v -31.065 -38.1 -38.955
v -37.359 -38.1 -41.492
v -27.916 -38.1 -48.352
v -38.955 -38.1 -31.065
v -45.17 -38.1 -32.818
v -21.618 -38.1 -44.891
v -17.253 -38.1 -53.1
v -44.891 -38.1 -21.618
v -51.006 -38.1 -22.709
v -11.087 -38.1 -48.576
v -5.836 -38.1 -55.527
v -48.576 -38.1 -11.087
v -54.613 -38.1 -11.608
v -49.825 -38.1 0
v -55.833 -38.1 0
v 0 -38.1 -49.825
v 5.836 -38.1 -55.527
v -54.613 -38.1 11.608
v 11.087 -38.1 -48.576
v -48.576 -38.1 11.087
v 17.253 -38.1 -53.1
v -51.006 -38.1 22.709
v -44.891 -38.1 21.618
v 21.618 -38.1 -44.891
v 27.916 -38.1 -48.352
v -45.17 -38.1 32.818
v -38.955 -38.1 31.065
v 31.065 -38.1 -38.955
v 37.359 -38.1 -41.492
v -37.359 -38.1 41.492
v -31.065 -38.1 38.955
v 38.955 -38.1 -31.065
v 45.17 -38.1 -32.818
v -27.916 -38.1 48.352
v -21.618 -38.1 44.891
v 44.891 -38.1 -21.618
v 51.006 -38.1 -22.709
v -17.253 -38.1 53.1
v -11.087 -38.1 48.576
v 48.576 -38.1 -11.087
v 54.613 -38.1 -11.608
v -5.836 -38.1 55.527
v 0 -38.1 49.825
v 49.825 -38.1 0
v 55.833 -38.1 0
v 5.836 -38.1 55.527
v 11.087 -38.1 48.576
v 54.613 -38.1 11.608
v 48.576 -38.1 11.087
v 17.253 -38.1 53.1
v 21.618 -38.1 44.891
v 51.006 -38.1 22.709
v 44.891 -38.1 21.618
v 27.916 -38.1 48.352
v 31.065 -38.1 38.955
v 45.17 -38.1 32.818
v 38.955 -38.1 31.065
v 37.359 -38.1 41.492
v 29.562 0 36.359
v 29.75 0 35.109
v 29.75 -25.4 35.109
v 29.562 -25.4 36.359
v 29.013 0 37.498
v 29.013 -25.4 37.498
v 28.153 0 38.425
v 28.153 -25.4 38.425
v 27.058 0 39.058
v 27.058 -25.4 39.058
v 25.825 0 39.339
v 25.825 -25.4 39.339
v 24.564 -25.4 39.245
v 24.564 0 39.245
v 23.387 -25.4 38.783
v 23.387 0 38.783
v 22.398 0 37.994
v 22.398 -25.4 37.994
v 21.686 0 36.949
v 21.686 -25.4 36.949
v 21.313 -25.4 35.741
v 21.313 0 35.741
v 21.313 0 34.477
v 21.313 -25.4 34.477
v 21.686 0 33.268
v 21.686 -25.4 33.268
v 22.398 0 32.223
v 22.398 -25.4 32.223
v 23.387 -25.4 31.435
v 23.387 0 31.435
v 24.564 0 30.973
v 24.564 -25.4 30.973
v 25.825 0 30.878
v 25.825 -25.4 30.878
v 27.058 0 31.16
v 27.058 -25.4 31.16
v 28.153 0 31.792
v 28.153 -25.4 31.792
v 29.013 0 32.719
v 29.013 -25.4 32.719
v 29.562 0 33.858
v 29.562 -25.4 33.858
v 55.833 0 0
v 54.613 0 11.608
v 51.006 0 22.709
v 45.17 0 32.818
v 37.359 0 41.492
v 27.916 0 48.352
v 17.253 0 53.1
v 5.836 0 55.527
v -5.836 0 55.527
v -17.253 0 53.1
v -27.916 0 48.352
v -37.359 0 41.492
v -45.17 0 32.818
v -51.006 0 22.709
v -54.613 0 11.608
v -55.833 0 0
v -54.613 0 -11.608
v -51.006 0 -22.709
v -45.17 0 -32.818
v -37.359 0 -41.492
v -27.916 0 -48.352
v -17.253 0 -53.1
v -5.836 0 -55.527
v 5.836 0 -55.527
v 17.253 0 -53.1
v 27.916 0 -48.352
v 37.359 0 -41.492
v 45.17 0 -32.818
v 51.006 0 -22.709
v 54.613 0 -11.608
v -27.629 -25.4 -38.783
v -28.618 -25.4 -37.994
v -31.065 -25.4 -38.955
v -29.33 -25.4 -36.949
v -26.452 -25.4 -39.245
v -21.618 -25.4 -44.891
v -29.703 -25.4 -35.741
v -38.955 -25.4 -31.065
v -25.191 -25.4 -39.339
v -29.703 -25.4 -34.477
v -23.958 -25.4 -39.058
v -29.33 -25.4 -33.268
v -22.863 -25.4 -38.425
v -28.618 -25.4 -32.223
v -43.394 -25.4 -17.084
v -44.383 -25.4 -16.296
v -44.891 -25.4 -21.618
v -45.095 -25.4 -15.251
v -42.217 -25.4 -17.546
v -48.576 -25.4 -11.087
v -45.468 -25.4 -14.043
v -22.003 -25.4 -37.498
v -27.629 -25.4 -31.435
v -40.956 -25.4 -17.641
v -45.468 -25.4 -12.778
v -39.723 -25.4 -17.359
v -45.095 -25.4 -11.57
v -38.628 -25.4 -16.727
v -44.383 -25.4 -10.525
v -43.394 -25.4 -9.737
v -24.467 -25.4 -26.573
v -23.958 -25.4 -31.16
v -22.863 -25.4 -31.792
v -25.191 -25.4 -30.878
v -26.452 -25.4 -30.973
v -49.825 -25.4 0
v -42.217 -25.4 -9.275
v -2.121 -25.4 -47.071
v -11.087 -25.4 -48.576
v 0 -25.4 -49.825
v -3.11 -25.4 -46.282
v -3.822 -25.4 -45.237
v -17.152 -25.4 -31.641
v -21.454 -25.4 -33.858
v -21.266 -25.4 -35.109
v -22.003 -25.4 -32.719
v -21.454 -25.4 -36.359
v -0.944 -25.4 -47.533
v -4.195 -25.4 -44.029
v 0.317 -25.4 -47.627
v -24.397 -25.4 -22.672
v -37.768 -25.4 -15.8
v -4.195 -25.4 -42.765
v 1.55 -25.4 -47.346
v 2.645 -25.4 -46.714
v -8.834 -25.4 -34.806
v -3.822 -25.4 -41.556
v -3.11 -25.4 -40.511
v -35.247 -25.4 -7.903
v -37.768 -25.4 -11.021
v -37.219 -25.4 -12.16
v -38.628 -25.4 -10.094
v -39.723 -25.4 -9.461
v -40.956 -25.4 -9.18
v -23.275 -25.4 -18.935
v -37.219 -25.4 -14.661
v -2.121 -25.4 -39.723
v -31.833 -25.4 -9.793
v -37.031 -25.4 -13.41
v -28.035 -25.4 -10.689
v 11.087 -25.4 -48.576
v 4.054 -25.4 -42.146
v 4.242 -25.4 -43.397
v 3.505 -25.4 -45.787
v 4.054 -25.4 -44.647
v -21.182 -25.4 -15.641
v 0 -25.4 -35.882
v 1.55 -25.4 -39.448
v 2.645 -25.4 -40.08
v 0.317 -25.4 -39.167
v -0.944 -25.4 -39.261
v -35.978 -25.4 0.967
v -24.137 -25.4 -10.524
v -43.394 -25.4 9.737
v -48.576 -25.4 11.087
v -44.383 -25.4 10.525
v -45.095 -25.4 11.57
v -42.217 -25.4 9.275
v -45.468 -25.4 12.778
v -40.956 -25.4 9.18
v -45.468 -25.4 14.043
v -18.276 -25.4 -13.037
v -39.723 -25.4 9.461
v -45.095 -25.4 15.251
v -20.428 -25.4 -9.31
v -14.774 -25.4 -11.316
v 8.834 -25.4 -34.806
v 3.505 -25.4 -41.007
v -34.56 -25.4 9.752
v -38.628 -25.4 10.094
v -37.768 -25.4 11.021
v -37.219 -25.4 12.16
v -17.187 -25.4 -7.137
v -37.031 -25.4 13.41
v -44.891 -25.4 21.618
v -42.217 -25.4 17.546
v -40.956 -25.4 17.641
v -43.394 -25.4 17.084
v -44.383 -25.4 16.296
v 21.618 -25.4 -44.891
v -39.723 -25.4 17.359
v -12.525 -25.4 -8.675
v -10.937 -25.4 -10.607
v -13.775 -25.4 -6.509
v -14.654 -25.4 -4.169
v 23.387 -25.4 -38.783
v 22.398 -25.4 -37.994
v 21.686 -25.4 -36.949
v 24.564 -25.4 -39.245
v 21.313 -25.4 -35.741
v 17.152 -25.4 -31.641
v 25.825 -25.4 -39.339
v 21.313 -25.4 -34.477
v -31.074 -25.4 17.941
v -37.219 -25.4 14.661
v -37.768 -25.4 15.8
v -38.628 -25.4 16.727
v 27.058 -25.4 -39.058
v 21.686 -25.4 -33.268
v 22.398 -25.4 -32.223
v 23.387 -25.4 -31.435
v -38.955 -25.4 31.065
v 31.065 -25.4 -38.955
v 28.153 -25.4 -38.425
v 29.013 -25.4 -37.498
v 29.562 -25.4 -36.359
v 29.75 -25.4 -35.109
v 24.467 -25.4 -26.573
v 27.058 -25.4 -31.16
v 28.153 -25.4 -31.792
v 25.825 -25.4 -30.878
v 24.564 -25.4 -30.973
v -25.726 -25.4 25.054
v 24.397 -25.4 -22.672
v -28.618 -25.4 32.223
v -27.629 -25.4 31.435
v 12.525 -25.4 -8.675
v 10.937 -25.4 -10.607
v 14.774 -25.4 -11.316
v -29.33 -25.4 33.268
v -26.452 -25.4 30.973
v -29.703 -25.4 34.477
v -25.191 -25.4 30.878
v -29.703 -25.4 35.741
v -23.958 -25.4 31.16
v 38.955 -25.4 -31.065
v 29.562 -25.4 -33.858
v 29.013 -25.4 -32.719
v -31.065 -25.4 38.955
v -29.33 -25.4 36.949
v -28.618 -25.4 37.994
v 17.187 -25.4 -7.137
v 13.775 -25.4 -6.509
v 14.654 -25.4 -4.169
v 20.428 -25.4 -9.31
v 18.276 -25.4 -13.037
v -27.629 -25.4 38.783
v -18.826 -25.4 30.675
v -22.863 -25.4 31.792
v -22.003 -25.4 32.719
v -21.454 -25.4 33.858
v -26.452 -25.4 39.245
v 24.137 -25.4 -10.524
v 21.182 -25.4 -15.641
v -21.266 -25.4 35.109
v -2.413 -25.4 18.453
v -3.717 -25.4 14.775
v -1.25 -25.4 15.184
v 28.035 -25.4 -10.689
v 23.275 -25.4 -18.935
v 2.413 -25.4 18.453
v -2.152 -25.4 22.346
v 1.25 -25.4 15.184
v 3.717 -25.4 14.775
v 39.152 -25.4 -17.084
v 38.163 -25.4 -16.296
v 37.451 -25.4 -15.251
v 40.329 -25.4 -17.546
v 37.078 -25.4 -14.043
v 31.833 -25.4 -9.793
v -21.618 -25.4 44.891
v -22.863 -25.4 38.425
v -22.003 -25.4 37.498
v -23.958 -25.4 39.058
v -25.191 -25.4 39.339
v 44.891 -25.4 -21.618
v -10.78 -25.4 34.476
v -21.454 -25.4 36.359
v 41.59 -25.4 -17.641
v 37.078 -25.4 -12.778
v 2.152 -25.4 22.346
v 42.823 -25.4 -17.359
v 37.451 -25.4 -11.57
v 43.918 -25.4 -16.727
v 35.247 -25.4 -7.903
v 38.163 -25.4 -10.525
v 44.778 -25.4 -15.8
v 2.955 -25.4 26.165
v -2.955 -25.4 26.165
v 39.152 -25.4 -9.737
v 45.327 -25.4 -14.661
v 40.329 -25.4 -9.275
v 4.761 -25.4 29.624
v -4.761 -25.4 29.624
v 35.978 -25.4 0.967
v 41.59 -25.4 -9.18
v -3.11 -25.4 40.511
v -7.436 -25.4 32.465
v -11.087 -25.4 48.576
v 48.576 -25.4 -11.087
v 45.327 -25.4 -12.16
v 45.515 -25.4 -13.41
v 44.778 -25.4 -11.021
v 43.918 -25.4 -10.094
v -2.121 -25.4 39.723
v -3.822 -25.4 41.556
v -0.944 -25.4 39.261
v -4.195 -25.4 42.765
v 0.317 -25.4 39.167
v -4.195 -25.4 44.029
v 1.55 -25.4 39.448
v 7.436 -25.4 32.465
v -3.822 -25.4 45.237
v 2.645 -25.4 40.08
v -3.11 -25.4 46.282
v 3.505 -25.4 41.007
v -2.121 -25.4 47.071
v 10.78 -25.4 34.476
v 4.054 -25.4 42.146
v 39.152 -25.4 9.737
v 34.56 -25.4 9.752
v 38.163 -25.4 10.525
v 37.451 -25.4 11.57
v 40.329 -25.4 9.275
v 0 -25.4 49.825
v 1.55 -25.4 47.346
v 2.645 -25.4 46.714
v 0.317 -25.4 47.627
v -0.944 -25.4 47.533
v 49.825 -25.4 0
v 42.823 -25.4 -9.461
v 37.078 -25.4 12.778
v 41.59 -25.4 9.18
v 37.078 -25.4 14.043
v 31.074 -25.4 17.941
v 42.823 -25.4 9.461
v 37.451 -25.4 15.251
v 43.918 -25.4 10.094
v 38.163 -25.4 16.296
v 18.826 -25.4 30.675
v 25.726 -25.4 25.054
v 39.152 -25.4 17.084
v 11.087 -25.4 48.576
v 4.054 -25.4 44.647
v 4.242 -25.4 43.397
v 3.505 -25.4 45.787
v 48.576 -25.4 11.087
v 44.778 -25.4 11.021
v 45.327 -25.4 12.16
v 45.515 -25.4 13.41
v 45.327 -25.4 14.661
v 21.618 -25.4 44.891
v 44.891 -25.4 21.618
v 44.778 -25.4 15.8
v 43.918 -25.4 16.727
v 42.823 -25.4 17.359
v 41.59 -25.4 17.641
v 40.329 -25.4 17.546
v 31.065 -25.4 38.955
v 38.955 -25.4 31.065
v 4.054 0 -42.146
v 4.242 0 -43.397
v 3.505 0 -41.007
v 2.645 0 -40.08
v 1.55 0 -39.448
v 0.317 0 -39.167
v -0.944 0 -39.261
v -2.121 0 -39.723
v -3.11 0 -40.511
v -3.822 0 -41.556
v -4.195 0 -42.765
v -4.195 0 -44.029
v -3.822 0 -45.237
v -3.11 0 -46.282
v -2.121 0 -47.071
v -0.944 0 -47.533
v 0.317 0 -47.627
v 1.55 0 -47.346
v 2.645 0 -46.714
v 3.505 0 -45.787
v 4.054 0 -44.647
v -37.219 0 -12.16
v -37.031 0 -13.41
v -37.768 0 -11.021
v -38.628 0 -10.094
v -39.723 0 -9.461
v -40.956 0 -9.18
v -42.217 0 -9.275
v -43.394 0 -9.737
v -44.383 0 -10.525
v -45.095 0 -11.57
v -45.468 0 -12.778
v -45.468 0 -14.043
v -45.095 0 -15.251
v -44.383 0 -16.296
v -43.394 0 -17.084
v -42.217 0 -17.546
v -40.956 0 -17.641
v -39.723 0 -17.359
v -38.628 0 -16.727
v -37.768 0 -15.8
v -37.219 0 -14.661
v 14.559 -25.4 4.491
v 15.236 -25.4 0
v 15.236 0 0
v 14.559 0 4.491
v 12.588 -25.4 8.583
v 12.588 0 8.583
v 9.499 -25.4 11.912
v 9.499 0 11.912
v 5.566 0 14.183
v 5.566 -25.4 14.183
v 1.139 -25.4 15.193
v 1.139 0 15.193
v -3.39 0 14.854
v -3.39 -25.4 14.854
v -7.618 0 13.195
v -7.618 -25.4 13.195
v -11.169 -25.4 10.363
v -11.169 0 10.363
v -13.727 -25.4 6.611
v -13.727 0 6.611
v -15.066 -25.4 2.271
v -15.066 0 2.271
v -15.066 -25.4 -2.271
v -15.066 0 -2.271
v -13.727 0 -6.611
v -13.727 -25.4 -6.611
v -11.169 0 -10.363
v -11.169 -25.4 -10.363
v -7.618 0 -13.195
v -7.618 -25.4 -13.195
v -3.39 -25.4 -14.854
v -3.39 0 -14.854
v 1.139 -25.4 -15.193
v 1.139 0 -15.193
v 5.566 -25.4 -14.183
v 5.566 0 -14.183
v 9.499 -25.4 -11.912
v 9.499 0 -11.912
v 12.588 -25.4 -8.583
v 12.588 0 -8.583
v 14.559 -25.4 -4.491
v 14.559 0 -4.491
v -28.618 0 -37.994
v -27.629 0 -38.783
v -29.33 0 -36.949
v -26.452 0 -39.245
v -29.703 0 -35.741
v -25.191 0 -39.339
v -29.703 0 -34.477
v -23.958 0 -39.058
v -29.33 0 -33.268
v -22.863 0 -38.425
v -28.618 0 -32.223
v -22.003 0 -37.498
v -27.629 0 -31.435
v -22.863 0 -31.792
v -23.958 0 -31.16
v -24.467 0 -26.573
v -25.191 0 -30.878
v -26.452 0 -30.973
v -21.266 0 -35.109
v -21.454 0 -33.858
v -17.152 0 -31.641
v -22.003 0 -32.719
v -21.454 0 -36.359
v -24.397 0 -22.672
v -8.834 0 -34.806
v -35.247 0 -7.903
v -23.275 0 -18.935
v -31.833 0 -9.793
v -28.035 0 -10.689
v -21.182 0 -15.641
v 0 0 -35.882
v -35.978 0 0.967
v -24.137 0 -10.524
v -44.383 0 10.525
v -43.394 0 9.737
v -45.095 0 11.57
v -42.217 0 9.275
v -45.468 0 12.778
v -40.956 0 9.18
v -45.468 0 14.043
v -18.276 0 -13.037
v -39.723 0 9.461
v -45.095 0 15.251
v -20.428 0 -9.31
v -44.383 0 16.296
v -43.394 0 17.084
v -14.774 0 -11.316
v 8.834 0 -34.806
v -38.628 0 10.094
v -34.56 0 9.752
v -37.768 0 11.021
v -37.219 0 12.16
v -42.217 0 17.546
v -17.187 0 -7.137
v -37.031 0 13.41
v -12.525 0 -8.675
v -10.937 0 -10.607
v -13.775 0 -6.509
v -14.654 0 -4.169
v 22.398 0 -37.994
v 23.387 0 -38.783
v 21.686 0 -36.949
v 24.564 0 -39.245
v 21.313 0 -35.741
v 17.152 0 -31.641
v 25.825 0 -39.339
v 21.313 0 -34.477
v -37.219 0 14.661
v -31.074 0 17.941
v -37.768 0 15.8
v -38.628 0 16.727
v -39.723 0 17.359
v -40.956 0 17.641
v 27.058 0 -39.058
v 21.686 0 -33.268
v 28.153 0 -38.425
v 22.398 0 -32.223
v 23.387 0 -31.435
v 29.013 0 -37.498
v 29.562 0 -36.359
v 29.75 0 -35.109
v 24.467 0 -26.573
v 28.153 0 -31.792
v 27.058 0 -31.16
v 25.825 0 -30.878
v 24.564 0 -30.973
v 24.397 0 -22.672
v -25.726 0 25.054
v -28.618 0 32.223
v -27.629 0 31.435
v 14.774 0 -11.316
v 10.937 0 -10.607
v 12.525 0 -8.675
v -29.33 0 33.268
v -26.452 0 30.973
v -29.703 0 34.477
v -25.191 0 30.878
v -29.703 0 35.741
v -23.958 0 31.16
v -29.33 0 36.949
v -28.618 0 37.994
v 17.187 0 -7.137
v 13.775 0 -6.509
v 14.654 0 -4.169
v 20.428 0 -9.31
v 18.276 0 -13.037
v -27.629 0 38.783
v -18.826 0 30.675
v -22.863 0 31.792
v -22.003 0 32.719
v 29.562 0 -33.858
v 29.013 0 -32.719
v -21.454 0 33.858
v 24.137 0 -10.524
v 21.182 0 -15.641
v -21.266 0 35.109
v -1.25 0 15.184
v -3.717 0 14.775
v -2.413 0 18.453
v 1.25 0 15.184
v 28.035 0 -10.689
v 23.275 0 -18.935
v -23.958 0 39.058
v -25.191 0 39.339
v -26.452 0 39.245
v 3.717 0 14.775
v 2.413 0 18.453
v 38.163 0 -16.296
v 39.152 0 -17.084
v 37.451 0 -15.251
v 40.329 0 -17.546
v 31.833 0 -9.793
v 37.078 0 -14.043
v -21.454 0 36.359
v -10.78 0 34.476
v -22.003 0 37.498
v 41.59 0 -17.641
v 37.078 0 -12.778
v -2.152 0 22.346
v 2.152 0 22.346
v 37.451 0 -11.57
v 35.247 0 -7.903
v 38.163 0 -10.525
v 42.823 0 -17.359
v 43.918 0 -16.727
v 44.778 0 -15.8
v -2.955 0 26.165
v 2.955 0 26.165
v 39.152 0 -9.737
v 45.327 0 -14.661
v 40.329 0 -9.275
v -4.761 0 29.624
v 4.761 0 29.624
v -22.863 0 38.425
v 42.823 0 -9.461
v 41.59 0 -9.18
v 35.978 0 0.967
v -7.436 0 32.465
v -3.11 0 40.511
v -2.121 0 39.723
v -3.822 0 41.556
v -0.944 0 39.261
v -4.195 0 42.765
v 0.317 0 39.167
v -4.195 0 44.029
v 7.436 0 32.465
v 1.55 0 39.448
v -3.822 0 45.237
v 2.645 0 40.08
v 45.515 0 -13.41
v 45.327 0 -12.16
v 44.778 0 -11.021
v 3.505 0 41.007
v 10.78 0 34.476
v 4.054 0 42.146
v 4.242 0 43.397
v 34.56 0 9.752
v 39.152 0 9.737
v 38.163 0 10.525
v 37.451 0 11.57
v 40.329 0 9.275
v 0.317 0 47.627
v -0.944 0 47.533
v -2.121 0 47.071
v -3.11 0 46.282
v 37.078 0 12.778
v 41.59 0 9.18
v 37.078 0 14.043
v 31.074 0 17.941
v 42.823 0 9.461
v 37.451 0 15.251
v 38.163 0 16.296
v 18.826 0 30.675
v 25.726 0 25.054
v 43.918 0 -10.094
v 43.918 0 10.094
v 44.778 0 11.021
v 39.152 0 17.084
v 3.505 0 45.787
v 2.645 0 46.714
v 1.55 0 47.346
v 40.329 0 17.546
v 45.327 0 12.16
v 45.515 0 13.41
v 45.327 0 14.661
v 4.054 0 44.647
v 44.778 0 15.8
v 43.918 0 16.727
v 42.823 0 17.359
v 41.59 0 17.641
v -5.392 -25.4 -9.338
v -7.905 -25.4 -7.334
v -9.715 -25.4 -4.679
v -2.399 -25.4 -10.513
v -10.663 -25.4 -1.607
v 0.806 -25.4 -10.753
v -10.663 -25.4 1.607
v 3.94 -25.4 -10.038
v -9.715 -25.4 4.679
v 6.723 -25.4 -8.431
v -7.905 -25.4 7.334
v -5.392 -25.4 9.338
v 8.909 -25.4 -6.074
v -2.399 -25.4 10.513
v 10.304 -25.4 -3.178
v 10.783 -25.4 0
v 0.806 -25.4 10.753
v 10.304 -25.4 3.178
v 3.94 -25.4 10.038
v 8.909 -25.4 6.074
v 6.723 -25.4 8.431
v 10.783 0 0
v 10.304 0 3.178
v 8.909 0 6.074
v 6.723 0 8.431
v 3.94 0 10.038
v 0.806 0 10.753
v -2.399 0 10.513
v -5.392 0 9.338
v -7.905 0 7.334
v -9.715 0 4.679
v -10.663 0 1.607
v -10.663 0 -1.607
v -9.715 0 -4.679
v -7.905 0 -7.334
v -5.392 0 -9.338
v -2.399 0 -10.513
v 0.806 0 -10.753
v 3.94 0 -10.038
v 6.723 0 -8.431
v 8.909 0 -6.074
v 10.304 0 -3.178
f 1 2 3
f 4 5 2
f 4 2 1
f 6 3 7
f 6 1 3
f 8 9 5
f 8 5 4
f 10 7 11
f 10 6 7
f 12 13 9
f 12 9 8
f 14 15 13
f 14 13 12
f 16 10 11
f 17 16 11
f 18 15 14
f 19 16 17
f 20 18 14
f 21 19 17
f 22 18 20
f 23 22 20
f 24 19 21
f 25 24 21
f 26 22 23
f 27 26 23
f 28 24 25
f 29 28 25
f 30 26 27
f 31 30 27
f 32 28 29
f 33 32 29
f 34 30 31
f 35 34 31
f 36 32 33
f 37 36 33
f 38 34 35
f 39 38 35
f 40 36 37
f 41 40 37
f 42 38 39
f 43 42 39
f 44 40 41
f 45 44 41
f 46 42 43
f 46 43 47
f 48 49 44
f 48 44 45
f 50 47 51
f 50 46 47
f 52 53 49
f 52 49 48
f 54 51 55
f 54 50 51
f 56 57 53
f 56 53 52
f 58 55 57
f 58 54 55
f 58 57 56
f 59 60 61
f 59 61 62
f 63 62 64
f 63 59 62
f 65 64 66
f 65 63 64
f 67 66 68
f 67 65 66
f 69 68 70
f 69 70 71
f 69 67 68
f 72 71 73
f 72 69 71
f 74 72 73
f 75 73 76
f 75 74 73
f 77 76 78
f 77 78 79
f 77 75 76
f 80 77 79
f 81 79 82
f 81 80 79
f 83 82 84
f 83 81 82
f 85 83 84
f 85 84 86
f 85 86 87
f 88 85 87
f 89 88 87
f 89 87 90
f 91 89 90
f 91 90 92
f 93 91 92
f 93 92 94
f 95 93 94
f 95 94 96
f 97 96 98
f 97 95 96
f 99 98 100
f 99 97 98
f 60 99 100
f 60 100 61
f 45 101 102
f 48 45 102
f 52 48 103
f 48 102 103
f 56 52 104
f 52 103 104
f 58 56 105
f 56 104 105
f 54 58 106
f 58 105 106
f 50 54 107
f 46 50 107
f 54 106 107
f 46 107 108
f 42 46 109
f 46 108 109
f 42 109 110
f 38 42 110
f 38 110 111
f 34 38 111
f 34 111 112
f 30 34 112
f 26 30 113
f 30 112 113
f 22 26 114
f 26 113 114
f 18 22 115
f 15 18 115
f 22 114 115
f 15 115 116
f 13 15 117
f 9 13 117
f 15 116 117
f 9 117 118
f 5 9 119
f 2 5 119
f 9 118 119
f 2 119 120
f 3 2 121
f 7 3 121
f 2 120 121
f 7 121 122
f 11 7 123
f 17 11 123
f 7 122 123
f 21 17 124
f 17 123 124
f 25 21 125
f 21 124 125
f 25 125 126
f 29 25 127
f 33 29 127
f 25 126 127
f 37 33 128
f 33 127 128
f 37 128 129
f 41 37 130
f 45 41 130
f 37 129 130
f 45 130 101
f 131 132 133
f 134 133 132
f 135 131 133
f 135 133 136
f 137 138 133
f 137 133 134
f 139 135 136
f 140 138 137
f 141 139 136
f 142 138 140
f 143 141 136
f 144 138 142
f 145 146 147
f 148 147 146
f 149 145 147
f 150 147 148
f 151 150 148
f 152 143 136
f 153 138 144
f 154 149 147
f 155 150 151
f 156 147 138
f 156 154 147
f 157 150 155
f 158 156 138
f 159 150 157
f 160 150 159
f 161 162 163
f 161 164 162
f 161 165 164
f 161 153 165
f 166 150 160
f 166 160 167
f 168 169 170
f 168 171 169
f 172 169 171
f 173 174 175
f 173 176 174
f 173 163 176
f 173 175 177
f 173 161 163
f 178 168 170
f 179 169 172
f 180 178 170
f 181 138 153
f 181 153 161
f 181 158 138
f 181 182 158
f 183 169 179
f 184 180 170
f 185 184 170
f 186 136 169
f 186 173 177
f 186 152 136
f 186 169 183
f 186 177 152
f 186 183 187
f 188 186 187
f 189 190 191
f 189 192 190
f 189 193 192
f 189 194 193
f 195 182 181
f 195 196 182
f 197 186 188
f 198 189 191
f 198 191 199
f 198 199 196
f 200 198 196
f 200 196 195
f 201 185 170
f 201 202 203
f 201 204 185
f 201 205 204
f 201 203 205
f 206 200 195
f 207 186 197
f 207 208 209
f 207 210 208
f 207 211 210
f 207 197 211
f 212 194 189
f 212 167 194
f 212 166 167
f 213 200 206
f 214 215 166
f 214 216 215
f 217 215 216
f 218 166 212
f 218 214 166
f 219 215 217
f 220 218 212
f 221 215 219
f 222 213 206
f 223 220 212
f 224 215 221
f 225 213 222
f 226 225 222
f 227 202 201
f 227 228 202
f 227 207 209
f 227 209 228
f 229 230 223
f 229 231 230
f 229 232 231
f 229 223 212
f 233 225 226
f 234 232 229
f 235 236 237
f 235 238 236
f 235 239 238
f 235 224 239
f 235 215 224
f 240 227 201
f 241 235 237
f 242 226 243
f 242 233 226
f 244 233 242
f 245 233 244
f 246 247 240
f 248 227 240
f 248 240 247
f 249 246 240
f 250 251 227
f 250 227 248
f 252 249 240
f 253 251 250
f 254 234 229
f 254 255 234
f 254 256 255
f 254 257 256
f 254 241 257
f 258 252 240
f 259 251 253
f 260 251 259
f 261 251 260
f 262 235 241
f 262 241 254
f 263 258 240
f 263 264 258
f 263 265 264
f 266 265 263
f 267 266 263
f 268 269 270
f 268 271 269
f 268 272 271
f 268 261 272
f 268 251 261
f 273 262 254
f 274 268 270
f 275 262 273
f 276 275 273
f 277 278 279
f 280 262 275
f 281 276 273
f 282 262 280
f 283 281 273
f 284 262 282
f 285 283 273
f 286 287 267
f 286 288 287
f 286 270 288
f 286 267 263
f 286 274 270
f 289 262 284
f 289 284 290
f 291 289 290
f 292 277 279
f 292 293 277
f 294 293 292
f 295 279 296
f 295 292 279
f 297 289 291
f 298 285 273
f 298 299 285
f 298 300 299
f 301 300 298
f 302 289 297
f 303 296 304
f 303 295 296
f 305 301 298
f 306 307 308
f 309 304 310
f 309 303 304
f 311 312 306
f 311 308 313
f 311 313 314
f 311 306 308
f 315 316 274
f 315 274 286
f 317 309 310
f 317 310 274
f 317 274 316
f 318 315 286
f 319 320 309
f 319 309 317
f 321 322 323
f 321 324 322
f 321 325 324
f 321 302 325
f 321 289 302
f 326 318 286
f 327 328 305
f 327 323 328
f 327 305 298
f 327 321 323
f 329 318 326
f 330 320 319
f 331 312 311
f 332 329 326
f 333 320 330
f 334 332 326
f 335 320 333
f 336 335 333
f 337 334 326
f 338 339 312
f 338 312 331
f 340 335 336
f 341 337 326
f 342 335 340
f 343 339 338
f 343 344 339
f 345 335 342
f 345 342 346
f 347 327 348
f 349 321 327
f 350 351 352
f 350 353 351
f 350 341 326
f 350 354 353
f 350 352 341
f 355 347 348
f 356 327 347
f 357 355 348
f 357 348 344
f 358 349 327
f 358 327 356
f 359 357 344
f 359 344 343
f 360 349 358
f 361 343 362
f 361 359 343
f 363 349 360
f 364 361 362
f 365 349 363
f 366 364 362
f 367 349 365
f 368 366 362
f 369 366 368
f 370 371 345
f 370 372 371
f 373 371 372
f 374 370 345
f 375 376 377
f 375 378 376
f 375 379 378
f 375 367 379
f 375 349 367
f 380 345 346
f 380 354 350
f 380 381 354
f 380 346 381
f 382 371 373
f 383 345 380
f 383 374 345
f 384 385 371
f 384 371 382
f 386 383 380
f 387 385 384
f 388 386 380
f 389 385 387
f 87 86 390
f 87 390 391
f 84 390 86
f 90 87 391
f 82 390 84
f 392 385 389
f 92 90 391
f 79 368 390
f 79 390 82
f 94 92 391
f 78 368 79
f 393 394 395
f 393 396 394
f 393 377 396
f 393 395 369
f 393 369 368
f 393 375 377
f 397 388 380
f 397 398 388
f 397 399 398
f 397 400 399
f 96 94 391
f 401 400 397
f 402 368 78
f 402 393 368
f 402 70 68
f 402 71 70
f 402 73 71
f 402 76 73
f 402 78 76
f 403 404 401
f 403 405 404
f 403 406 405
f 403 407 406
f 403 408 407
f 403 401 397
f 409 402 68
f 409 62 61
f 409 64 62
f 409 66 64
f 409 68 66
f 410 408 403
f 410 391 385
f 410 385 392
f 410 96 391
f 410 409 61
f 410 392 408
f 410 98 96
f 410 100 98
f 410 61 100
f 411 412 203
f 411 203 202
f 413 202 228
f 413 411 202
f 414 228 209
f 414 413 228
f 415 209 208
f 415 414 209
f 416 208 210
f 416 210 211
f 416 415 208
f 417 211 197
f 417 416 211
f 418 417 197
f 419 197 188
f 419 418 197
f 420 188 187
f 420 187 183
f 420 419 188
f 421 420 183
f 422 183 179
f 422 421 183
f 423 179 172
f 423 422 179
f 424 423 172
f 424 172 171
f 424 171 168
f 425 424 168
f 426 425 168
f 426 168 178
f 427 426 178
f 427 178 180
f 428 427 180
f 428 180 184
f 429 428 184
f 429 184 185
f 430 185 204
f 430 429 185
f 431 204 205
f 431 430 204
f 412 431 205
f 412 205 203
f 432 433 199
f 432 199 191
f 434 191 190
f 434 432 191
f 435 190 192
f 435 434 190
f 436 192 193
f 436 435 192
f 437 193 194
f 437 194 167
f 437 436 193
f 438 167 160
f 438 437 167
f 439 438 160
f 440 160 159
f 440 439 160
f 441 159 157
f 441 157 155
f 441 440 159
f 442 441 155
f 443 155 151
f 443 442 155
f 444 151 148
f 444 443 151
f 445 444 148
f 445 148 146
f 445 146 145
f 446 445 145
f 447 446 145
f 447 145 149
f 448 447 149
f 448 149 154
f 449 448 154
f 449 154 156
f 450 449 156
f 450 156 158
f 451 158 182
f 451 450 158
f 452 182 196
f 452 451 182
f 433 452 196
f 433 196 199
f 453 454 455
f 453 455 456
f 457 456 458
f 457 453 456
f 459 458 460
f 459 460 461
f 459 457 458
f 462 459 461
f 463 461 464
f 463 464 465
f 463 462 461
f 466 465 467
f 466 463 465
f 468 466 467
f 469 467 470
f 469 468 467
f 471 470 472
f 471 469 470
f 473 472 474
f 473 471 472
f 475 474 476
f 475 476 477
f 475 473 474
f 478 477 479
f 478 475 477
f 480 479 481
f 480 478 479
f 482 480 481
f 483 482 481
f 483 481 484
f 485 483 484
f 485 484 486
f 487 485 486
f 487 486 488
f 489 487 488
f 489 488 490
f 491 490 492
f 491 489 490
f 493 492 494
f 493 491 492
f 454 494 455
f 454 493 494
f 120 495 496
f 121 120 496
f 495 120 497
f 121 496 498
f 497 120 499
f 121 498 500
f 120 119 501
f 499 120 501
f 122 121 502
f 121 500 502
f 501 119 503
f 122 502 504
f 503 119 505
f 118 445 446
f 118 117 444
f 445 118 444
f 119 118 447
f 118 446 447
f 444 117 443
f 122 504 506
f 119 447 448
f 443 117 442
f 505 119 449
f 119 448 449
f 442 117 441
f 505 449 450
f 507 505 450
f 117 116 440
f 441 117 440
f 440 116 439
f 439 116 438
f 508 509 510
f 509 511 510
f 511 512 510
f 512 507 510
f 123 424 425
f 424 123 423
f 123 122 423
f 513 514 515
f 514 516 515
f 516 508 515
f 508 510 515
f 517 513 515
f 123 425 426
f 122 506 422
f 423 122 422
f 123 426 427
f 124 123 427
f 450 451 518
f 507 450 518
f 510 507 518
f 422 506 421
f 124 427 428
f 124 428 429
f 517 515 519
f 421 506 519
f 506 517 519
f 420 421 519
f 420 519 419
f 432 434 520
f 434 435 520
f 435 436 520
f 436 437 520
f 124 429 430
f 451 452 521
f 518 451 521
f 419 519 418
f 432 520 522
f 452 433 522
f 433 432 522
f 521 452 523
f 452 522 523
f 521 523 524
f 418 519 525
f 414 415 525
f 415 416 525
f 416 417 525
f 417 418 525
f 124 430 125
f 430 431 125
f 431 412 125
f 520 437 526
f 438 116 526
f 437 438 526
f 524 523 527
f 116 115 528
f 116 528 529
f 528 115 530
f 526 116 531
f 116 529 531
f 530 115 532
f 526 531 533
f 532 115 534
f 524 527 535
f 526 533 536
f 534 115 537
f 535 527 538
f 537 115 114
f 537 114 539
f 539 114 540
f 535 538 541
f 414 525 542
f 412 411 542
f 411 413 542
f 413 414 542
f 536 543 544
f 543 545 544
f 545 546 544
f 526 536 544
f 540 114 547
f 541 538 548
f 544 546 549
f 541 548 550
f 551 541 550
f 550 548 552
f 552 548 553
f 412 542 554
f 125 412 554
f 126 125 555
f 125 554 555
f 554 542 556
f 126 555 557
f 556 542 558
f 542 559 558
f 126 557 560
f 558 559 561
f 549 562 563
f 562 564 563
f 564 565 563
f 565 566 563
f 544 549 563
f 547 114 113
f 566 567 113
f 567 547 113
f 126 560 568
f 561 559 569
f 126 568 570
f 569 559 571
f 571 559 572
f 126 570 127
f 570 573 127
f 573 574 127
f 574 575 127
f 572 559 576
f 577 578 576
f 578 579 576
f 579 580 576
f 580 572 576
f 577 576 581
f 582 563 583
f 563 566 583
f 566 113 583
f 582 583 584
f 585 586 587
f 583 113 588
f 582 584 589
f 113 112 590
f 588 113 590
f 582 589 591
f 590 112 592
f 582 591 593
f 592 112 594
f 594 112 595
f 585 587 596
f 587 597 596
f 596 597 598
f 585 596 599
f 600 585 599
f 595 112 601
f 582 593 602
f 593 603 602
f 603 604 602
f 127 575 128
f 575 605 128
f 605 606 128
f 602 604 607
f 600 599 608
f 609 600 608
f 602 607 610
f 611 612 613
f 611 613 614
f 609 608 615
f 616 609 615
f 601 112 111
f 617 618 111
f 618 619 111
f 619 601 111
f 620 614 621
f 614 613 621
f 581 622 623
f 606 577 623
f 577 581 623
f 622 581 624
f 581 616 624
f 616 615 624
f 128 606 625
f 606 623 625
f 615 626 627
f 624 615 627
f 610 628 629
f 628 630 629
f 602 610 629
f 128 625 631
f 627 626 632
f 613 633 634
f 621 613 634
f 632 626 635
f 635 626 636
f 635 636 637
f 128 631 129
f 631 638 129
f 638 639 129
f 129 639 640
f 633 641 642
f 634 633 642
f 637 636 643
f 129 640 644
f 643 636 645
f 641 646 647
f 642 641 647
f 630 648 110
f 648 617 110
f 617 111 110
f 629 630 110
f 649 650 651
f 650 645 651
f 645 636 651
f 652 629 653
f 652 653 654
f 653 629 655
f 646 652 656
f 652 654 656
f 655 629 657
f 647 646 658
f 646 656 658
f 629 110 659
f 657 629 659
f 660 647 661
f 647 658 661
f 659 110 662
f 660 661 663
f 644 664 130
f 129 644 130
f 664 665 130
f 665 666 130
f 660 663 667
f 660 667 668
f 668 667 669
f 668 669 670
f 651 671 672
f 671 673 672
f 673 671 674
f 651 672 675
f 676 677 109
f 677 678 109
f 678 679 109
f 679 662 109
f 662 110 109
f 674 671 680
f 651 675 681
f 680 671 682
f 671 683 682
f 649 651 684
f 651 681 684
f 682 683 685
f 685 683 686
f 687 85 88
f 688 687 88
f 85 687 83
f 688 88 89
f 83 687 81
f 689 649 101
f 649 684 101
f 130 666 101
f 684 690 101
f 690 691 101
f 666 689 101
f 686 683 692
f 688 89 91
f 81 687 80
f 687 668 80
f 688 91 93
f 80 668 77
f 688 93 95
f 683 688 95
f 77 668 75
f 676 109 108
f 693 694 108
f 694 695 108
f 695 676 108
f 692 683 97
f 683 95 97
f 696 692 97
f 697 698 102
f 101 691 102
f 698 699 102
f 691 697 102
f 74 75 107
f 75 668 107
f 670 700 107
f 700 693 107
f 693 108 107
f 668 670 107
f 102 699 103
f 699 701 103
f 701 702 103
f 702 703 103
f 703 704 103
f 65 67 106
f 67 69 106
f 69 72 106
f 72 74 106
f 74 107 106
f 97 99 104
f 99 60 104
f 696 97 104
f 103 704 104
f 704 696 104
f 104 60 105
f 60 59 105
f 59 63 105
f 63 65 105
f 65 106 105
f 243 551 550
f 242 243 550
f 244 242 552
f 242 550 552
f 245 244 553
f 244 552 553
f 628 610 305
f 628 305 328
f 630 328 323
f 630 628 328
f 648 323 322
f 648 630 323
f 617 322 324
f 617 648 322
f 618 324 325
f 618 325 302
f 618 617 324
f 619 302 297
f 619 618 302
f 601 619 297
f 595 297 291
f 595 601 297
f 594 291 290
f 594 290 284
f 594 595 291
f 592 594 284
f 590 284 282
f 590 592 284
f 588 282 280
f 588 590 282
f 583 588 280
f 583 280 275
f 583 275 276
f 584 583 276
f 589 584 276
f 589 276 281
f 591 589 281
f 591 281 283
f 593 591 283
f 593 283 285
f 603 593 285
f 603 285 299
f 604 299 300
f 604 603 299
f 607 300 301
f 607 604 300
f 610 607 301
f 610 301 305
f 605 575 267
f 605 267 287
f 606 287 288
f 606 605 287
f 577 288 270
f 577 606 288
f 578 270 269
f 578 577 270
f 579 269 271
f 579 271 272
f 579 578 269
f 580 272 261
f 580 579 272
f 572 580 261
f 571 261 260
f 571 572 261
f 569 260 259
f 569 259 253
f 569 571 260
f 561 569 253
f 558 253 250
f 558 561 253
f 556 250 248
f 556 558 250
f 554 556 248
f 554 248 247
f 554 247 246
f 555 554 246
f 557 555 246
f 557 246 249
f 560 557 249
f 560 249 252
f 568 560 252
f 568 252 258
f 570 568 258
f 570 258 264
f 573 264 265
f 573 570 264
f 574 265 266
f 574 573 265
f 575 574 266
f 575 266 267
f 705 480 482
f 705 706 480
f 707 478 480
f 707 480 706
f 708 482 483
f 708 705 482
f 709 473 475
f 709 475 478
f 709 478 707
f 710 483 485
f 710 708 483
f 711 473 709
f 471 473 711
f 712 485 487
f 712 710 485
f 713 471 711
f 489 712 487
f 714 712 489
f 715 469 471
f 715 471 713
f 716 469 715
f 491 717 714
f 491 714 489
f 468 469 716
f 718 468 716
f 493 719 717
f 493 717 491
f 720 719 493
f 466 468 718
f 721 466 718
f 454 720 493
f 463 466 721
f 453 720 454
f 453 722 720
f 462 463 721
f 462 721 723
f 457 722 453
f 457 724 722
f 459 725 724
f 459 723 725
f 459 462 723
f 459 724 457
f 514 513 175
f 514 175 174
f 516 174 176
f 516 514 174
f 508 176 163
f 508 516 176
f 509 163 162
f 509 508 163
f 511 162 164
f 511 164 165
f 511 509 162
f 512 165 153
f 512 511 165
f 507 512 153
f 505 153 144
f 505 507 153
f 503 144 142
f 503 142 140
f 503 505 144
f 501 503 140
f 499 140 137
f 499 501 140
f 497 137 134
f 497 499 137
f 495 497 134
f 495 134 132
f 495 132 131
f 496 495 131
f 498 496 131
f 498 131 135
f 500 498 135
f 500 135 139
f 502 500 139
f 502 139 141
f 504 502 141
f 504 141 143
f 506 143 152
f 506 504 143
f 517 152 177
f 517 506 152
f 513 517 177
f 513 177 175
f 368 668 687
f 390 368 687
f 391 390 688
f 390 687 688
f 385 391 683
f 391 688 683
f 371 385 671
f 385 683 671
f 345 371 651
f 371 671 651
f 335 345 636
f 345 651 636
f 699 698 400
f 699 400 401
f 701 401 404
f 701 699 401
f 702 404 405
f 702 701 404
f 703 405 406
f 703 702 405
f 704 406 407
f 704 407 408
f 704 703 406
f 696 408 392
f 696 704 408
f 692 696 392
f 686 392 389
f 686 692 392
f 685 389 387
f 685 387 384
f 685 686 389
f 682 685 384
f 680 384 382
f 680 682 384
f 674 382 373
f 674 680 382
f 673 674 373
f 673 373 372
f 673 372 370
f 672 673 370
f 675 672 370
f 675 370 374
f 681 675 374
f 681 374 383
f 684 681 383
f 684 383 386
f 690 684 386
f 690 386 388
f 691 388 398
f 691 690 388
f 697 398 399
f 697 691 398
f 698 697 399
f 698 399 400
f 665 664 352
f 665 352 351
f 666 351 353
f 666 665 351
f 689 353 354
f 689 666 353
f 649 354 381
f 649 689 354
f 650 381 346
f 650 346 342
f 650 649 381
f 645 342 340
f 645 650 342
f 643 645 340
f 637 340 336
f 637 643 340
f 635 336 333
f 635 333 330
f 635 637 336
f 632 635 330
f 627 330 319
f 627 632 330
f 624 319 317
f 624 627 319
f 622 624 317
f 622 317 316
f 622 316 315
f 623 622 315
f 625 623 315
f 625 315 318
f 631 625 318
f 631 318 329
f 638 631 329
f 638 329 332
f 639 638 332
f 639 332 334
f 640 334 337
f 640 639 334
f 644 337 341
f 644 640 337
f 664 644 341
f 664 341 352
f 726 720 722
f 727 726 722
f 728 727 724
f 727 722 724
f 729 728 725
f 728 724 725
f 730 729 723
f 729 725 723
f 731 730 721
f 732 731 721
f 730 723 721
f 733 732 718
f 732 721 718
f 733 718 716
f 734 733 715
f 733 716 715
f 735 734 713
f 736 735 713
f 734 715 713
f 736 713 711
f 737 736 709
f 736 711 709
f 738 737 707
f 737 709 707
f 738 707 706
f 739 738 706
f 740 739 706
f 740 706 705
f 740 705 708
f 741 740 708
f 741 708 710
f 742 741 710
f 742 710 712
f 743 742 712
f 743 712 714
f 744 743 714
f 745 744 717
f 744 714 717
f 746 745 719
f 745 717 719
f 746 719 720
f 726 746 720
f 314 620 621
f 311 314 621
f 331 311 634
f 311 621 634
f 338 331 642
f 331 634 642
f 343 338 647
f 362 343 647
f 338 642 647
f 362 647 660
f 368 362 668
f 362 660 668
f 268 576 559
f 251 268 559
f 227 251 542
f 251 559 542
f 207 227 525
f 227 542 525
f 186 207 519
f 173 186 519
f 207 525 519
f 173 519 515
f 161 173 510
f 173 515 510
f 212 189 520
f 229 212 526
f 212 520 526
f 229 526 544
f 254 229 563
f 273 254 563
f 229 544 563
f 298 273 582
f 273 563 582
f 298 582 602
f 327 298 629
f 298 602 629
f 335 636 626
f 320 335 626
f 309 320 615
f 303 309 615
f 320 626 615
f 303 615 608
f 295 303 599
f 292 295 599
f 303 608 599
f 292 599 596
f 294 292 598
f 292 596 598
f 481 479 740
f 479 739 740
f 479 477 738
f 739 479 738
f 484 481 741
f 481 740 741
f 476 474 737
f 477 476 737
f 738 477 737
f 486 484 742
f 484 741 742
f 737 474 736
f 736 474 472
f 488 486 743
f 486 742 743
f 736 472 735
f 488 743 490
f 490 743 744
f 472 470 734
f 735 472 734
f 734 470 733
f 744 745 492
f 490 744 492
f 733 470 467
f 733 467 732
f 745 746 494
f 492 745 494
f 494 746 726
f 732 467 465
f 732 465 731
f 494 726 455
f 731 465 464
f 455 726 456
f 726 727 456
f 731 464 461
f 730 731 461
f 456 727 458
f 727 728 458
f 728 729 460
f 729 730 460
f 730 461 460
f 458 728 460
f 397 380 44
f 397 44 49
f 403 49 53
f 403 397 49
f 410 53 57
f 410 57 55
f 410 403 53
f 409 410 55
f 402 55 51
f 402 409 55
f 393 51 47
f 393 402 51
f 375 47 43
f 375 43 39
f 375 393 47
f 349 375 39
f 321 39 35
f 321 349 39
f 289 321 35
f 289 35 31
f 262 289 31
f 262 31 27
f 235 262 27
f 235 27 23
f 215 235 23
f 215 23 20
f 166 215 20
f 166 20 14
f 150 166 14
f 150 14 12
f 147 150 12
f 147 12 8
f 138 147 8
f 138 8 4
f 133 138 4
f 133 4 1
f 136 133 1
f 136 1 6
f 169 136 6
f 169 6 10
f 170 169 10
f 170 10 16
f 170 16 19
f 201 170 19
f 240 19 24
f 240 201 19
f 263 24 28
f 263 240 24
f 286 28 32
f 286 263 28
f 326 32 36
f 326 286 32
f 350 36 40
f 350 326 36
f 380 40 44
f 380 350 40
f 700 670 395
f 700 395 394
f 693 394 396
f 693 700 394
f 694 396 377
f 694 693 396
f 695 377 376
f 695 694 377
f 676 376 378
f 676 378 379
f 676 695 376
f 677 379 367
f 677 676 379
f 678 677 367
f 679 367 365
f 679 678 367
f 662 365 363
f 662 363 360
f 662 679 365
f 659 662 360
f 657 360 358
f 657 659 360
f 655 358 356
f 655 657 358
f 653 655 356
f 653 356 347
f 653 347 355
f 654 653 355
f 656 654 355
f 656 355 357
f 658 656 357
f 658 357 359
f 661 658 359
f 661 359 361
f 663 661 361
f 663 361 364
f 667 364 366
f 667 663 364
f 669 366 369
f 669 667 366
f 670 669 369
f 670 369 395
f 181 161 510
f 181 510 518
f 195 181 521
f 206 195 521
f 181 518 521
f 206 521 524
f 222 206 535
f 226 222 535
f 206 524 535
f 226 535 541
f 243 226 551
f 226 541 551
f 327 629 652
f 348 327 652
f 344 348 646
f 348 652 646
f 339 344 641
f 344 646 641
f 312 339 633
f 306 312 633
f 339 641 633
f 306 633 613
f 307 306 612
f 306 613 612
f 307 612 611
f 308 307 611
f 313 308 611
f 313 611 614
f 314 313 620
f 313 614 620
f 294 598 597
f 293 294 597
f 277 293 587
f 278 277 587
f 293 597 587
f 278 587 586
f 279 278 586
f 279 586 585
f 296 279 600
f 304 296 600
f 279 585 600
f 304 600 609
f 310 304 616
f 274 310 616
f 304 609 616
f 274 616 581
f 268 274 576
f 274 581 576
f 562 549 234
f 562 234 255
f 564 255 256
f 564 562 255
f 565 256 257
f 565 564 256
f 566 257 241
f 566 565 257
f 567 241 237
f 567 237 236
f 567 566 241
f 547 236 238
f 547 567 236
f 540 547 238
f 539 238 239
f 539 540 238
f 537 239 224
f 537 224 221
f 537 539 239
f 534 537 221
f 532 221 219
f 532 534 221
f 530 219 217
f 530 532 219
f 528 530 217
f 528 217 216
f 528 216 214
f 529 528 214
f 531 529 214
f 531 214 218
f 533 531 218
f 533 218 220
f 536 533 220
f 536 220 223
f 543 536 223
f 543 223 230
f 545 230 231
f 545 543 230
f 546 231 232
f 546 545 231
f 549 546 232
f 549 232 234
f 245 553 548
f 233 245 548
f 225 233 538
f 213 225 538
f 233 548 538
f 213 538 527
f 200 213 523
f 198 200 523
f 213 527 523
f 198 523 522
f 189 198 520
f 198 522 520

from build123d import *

# Parameters (mm, degrees)
F0_R     = 50.459269
F0_R_2   = 4.242185
F1_DEPTH = 25.4
F2_R     = 15.235749
F2_R_2   = 10.783118
F3_DEPTH = 25.4
F4_R     = 55.832634
F4_R_2   = 49.824979
F5_DEPTH = 38.1


with BuildPart() as f1:
    # F0 (on Front) → F1 (new body)
    with BuildSketch(Plane.XZ):
        Circle(F0_R)
        with Locations((-25.508015, -35.10877)):
            Circle(F0_R_2, mode=Mode.SUBTRACT)
        with Locations((0, -43.396827)):
            Circle(F0_R_2, mode=Mode.SUBTRACT)
        with Locations((-41.272835, -13.410357)):
            Circle(F0_R_2, mode=Mode.SUBTRACT)
        with BuildLine():
            ThreePointArc((-10.779512, 34.475856), (-2.954578, 26.164866), (-3.717073, 14.775366))
            ThreePointArc((-3.717073, 14.775366), (0, 15.235749), (3.717073, 14.775366))
            ThreePointArc((3.717073, 14.775366), (2.954578, 26.164866), (10.779512, 34.475856))
            ThreePointArc((10.779512, 34.475856), (31.07446, 17.940848), (35.246723, -7.902596))
            ThreePointArc((35.246723, -7.902596), (24.136728, -10.523693), (14.654378, -4.168603))
            ThreePointArc((14.654378, -4.168603), (13.194546, -7.617875), (10.937306, -10.606762))
            ThreePointArc((10.937306, -10.606762), (21.18215, -15.641173), (24.467211, -26.573259))
            ThreePointArc((24.467211, -26.573259), (0, -35.881695), (-24.467211, -26.573259))
            ThreePointArc((-24.467211, -26.573259), (-21.18215, -15.641173), (-10.937306, -10.606762))
            ThreePointArc((-10.937306, -10.606762), (-13.194546, -7.617875), (-14.654378, -4.168603))
            ThreePointArc((-14.654378, -4.168603), (-24.136728, -10.523693), (-35.246723, -7.902596))
            ThreePointArc((-35.246723, -7.902596), (-31.07446, 17.940848), (-10.779512, 34.475856))
        make_face(mode=Mode.SUBTRACT)
        with Locations((25.508015, -35.10877)):
            Circle(F0_R_2, mode=Mode.SUBTRACT)
        with Locations((41.272835, -13.410357)):
            Circle(F0_R_2, mode=Mode.SUBTRACT)
        with Locations((-41.272835, 13.410357)):
            Circle(F0_R_2, mode=Mode.SUBTRACT)
        with Locations((-25.508015, 35.10877)):
            Circle(F0_R_2, mode=Mode.SUBTRACT)
        with Locations((0, 43.396827)):
            Circle(F0_R_2, mode=Mode.SUBTRACT)
        with Locations((41.272835, 13.410357)):
            Circle(F0_R_2, mode=Mode.SUBTRACT)
        with Locations((25.508015, 35.10877)):
            Circle(F0_R_2, mode=Mode.SUBTRACT)
    extrude(amount=F1_DEPTH)

    # F4 (on Front) → F5 (join)
    with BuildSketch(Plane.XZ):
        Circle(F4_R)
        Circle(F4_R_2, mode=Mode.SUBTRACT)
    extrude(amount=F5_DEPTH)


with BuildPart() as f3:
    # F2 (on face) → F3 (new body)
    with BuildSketch(Plane.XZ.offset(25.4)):
        Circle(F2_R)
        Circle(F2_R_2, mode=Mode.SUBTRACT)
    extrude(amount=-F3_DEPTH)


solid = Compound([f1.part, f3.part])
